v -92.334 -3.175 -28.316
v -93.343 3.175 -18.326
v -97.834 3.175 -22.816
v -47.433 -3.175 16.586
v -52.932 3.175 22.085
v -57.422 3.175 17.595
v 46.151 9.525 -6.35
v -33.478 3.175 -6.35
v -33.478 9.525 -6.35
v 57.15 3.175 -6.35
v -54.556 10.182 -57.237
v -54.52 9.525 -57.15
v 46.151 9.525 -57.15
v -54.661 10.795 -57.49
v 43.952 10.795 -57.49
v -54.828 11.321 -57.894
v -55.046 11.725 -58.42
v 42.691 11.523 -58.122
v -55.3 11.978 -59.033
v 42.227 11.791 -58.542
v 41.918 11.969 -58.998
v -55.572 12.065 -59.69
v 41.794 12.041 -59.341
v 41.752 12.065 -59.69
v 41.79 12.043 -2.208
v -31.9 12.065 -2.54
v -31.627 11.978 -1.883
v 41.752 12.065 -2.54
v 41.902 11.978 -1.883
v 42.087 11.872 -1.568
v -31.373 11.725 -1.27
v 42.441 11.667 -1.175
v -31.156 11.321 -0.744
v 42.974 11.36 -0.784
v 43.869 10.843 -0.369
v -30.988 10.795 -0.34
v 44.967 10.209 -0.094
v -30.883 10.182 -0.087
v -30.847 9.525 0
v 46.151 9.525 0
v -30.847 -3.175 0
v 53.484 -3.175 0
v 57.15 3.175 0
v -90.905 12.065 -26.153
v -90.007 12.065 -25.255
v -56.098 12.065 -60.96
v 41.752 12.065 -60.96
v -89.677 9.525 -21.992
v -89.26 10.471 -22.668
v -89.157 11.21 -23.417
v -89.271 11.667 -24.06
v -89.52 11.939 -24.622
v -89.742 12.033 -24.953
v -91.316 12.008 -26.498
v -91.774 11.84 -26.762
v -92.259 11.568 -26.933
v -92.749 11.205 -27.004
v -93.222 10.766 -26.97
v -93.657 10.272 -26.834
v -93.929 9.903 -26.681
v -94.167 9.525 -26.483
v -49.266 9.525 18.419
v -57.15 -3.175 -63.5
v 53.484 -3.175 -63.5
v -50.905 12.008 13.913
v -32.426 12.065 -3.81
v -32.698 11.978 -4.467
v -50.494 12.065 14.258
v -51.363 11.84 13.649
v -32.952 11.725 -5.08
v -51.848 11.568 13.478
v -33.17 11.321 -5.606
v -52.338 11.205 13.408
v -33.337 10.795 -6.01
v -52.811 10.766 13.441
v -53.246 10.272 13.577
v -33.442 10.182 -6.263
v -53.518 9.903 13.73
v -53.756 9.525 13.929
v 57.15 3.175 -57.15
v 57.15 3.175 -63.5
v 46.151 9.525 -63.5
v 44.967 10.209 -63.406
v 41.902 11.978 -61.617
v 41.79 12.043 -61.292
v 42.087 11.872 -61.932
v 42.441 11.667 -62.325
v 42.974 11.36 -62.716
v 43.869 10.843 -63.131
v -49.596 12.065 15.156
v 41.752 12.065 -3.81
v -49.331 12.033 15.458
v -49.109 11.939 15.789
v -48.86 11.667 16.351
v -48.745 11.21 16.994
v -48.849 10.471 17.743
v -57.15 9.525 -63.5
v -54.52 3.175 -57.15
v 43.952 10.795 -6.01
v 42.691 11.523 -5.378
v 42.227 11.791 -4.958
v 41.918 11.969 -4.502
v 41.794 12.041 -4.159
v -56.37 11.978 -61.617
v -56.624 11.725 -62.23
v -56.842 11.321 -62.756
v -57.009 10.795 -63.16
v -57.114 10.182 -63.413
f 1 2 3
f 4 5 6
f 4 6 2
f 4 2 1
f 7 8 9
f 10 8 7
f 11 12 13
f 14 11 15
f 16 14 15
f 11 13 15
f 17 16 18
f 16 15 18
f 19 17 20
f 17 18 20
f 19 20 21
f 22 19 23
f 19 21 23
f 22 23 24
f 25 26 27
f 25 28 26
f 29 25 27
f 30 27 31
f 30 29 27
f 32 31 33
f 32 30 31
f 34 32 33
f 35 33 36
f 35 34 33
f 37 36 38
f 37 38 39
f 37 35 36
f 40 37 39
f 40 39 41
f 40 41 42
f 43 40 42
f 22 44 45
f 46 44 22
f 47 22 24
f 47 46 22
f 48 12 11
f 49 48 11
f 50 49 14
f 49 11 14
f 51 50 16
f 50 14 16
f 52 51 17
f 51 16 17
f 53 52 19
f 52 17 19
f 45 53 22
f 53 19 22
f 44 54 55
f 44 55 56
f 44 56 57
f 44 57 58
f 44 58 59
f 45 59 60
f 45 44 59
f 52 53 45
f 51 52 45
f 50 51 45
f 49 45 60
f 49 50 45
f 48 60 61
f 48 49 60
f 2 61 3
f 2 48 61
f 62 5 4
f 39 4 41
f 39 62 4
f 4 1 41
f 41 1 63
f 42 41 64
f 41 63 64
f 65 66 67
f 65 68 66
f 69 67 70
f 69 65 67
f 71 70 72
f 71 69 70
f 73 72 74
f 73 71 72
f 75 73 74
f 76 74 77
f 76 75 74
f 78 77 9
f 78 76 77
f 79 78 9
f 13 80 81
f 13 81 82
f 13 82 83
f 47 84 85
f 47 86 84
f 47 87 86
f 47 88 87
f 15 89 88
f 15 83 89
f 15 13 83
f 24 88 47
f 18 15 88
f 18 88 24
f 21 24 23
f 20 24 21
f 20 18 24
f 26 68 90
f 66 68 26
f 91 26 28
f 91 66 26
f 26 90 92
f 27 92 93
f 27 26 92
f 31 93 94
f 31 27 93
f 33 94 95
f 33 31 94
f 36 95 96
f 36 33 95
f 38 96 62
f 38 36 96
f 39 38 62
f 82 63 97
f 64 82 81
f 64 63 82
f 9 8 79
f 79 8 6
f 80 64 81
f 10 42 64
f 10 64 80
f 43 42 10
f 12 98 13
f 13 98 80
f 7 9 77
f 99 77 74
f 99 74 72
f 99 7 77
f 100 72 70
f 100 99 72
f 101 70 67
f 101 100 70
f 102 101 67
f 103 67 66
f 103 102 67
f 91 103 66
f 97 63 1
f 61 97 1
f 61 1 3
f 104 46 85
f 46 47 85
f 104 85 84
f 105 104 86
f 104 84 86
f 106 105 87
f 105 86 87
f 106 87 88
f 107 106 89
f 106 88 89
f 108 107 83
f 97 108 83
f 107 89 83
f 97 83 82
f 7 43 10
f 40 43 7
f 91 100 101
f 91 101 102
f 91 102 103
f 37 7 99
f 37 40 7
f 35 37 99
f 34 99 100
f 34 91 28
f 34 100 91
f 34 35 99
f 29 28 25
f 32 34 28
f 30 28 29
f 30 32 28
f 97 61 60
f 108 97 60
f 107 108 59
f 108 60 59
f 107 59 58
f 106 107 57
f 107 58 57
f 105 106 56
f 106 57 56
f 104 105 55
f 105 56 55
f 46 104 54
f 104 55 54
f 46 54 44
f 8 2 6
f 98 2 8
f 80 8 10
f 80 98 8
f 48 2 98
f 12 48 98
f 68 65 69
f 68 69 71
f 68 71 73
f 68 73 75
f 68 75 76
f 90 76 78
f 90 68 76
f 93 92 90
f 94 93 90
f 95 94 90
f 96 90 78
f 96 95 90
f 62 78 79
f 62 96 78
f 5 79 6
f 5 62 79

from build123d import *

# Parameters (mm, degrees)
SKETCH1_W               = 114.3
SKETCH1_H               = 6.35
BOSS_EXTRUDE1_DEPTH     = 63.5
SKETCH2_W               = 114.3
SKETCH2_H               = 6.35
BOSS_EXTRUDE2_DEPTH     = 8.89
CUT_EXTRUDE1_DEPTH      = 64.5
CUT_EXTRUDE2_DEPTH      = 13.065
CUT_EXTRUDE2_DEPTH_BACK = 4.175
BOSS_EXTRUDE4_DEPTH     = 3.175
BOSS_EXTRUDE5_DEPTH     = 8.89
FILLET1_R               = 2.54
CUT_EXTRUDE3_DEPTH      = 93.267614143


with BuildPart() as part:
    # Sketch1 → Boss-Extrude1 (new body)
    with BuildSketch(Plane.XY):
        Rectangle(SKETCH1_W, SKETCH1_H)
    extrude(amount=-BOSS_EXTRUDE1_DEPTH)

    # Sketch2 → Boss-Extrude2 (add)
    with BuildSketch(Plane(origin=(0, 3.175, 0), x_dir=(1, 0, 0), z_dir=(0, 1, 0))):
        with Locations((0, 60.325)):
            Rectangle(SKETCH2_W, SKETCH2_H)
        with Locations((0, 3.175)):
            Rectangle(SKETCH2_W, SKETCH2_H)
    extrude(amount=BOSS_EXTRUDE2_DEPTH)

    # Sketch3 → Cut-Extrude1 (cut, through all)
    with BuildSketch(Plane.XY):
        Polygon((57.15, 3.175), (41.752068321, 12.065), (48.527437664, 23.800283942), (66.675, 13.322783942), (57.15, -3.175), (56.233456448, -4.7625), (53.483825791, -3.175), align=None)
    extrude(amount=-CUT_EXTRUDE1_DEPTH, mode=Mode.SUBTRACT)

    # Sketch5 → Cut-Extrude2 (cut, two sides)
    with BuildSketch(Plane(origin=(0, 0, 0), x_dir=(1, 0, 0), z_dir=(0, 1, 0))) as cut_extrude2_sk:
        Polygon((-57.15, 63.5), (-30.847438789, 0), (-57.15, 0), align=None)
    extrude(amount=CUT_EXTRUDE2_DEPTH, mode=Mode.SUBTRACT)
    extrude(cut_extrude2_sk.sketch, amount=-CUT_EXTRUDE2_DEPTH_BACK, mode=Mode.SUBTRACT)

    # Sketch9 → Boss-Extrude4 (add, symmetric)
    with BuildSketch(Plane(origin=(0, 0, 0), x_dir=(1, 0, 0), z_dir=(0, 1, 0))):
        Polygon((-30.847438789, 0), (-57.15, 63.5), (-97.833550078, 22.816449922), (-52.932269473, -22.084830683), align=None)
    extrude(amount=BOSS_EXTRUDE4_DEPTH, both=True)

    # Sketch11 → Boss-Extrude5 (add)
    with BuildSketch(Plane(origin=(0, 3.175, 0), x_dir=(1, 0, 0), z_dir=(0, 1, 0))):
        Polygon((-57.15, 63.5), (-97.833550078, 22.816449922), (-93.343422018, 18.326321861), (-54.519743879, 57.15), align=None)
        Polygon((-33.47769491, 6.35), (-57.422397533, -17.594702623), (-52.932269473, -22.084830683), (-30.847438789, 0), align=None)
    extrude(amount=BOSS_EXTRUDE5_DEPTH)

    # Fillet1
    fillet1_edges = [part.edges().sort_by_distance(p)[0] for p in [
        (-41.889854131, 12.065, 11.042415342),
        (5.452314766, 12.065, 0),
        (4.137186705, 12.065, -6.35),
        (-45.450046222, 12.065, 5.622351311),
        (-73.931582948, 12.065, -37.738160931),
        (-6.383837779, 12.065, -57.15),
        (-7.69896584, 12.065, -63.5),
        (-77.491775039, 12.065, -43.158224961),
    ]]
    fillet(fillet1_edges, radius=FILLET1_R)

    # Sketch12 → Cut-Extrude3 (cut, through all)
    with BuildSketch(Plane(origin=(-15.423719395, 0, -15.423719395), x_dir=(0.707106781, 0, -0.707106781), z_dir=(0.707106781, 0, 0.707106781))):
        Polygon((-53.045100225, 3.175), (-45.267970292, -3.175), (-53.300155549, -13.012377699), (-72.974910948, 3.051992814), (-56.910540434, 22.726748213), (-45.012914969, 13.012377699), align=None)
    extrude(amount=-CUT_EXTRUDE3_DEPTH, mode=Mode.SUBTRACT)


solid = part.part
